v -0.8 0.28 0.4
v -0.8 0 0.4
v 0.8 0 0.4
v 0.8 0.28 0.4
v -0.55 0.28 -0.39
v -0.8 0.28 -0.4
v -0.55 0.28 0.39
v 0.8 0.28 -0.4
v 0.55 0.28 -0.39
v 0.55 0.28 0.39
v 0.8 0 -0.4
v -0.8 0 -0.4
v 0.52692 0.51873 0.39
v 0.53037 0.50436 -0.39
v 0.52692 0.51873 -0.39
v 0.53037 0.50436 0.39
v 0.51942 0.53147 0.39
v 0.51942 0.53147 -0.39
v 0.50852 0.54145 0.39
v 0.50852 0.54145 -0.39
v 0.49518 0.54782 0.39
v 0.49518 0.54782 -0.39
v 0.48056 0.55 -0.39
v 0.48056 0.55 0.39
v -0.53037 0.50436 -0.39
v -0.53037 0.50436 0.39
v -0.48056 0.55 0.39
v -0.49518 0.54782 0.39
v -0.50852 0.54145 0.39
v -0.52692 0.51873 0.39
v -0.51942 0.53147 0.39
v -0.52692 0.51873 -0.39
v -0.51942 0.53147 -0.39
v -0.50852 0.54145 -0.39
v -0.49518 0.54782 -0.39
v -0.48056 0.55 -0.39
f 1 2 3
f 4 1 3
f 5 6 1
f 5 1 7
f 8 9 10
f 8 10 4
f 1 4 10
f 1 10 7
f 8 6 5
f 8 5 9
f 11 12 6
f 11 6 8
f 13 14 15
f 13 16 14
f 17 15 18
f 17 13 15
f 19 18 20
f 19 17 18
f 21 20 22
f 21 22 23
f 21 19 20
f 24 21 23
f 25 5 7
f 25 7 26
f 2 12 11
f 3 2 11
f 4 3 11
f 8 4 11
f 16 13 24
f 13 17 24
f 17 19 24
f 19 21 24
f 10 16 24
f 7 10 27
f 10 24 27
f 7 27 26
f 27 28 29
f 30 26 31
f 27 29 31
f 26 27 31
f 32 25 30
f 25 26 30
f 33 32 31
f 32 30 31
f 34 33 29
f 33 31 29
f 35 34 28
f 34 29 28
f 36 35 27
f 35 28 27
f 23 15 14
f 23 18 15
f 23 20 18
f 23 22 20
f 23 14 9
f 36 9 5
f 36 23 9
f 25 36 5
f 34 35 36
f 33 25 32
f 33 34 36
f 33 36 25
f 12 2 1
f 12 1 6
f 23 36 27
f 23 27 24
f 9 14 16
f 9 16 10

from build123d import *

# Parameters (mm, degrees)
SKETCH1_W       = 1.6
SKETCH1_H       = 0.8
BASE_DEPTH      = 0.28
LENS_DEPTH      = 0.39
LENS_DEPTH_BACK = 0.39
LENS_ROUNDS_R   = 0.05


with BuildPart() as part:
    # Sketch1 → Base (new body)
    with BuildSketch(Plane(origin=(0, 0, 0), x_dir=(1, 0, 0), z_dir=(0, 1, 0))):
        Rectangle(SKETCH1_W, SKETCH1_H)
    extrude(amount=BASE_DEPTH)

    # Sketch2 → Lens (add, two sides: drawn at the far end of the back side and taken through both)
    with BuildSketch(Plane.XY.offset(-LENS_DEPTH_BACK)):
        Polygon((-0.55, 0.28), (-0.526378061, 0.55), (0.526378061, 0.55), (0.55, 0.28), align=None)
    extrude(amount=LENS_DEPTH + LENS_DEPTH_BACK)

    # Lens Rounds
    lens_rounds_edges = [part.edges().sort_by_distance(p)[0] for p in [
        (-0.526378061, 0.55, 0),
        (0.526378061, 0.55, 0),
    ]]
    fillet(lens_rounds_edges, radius=LENS_ROUNDS_R)


solid = part.part
